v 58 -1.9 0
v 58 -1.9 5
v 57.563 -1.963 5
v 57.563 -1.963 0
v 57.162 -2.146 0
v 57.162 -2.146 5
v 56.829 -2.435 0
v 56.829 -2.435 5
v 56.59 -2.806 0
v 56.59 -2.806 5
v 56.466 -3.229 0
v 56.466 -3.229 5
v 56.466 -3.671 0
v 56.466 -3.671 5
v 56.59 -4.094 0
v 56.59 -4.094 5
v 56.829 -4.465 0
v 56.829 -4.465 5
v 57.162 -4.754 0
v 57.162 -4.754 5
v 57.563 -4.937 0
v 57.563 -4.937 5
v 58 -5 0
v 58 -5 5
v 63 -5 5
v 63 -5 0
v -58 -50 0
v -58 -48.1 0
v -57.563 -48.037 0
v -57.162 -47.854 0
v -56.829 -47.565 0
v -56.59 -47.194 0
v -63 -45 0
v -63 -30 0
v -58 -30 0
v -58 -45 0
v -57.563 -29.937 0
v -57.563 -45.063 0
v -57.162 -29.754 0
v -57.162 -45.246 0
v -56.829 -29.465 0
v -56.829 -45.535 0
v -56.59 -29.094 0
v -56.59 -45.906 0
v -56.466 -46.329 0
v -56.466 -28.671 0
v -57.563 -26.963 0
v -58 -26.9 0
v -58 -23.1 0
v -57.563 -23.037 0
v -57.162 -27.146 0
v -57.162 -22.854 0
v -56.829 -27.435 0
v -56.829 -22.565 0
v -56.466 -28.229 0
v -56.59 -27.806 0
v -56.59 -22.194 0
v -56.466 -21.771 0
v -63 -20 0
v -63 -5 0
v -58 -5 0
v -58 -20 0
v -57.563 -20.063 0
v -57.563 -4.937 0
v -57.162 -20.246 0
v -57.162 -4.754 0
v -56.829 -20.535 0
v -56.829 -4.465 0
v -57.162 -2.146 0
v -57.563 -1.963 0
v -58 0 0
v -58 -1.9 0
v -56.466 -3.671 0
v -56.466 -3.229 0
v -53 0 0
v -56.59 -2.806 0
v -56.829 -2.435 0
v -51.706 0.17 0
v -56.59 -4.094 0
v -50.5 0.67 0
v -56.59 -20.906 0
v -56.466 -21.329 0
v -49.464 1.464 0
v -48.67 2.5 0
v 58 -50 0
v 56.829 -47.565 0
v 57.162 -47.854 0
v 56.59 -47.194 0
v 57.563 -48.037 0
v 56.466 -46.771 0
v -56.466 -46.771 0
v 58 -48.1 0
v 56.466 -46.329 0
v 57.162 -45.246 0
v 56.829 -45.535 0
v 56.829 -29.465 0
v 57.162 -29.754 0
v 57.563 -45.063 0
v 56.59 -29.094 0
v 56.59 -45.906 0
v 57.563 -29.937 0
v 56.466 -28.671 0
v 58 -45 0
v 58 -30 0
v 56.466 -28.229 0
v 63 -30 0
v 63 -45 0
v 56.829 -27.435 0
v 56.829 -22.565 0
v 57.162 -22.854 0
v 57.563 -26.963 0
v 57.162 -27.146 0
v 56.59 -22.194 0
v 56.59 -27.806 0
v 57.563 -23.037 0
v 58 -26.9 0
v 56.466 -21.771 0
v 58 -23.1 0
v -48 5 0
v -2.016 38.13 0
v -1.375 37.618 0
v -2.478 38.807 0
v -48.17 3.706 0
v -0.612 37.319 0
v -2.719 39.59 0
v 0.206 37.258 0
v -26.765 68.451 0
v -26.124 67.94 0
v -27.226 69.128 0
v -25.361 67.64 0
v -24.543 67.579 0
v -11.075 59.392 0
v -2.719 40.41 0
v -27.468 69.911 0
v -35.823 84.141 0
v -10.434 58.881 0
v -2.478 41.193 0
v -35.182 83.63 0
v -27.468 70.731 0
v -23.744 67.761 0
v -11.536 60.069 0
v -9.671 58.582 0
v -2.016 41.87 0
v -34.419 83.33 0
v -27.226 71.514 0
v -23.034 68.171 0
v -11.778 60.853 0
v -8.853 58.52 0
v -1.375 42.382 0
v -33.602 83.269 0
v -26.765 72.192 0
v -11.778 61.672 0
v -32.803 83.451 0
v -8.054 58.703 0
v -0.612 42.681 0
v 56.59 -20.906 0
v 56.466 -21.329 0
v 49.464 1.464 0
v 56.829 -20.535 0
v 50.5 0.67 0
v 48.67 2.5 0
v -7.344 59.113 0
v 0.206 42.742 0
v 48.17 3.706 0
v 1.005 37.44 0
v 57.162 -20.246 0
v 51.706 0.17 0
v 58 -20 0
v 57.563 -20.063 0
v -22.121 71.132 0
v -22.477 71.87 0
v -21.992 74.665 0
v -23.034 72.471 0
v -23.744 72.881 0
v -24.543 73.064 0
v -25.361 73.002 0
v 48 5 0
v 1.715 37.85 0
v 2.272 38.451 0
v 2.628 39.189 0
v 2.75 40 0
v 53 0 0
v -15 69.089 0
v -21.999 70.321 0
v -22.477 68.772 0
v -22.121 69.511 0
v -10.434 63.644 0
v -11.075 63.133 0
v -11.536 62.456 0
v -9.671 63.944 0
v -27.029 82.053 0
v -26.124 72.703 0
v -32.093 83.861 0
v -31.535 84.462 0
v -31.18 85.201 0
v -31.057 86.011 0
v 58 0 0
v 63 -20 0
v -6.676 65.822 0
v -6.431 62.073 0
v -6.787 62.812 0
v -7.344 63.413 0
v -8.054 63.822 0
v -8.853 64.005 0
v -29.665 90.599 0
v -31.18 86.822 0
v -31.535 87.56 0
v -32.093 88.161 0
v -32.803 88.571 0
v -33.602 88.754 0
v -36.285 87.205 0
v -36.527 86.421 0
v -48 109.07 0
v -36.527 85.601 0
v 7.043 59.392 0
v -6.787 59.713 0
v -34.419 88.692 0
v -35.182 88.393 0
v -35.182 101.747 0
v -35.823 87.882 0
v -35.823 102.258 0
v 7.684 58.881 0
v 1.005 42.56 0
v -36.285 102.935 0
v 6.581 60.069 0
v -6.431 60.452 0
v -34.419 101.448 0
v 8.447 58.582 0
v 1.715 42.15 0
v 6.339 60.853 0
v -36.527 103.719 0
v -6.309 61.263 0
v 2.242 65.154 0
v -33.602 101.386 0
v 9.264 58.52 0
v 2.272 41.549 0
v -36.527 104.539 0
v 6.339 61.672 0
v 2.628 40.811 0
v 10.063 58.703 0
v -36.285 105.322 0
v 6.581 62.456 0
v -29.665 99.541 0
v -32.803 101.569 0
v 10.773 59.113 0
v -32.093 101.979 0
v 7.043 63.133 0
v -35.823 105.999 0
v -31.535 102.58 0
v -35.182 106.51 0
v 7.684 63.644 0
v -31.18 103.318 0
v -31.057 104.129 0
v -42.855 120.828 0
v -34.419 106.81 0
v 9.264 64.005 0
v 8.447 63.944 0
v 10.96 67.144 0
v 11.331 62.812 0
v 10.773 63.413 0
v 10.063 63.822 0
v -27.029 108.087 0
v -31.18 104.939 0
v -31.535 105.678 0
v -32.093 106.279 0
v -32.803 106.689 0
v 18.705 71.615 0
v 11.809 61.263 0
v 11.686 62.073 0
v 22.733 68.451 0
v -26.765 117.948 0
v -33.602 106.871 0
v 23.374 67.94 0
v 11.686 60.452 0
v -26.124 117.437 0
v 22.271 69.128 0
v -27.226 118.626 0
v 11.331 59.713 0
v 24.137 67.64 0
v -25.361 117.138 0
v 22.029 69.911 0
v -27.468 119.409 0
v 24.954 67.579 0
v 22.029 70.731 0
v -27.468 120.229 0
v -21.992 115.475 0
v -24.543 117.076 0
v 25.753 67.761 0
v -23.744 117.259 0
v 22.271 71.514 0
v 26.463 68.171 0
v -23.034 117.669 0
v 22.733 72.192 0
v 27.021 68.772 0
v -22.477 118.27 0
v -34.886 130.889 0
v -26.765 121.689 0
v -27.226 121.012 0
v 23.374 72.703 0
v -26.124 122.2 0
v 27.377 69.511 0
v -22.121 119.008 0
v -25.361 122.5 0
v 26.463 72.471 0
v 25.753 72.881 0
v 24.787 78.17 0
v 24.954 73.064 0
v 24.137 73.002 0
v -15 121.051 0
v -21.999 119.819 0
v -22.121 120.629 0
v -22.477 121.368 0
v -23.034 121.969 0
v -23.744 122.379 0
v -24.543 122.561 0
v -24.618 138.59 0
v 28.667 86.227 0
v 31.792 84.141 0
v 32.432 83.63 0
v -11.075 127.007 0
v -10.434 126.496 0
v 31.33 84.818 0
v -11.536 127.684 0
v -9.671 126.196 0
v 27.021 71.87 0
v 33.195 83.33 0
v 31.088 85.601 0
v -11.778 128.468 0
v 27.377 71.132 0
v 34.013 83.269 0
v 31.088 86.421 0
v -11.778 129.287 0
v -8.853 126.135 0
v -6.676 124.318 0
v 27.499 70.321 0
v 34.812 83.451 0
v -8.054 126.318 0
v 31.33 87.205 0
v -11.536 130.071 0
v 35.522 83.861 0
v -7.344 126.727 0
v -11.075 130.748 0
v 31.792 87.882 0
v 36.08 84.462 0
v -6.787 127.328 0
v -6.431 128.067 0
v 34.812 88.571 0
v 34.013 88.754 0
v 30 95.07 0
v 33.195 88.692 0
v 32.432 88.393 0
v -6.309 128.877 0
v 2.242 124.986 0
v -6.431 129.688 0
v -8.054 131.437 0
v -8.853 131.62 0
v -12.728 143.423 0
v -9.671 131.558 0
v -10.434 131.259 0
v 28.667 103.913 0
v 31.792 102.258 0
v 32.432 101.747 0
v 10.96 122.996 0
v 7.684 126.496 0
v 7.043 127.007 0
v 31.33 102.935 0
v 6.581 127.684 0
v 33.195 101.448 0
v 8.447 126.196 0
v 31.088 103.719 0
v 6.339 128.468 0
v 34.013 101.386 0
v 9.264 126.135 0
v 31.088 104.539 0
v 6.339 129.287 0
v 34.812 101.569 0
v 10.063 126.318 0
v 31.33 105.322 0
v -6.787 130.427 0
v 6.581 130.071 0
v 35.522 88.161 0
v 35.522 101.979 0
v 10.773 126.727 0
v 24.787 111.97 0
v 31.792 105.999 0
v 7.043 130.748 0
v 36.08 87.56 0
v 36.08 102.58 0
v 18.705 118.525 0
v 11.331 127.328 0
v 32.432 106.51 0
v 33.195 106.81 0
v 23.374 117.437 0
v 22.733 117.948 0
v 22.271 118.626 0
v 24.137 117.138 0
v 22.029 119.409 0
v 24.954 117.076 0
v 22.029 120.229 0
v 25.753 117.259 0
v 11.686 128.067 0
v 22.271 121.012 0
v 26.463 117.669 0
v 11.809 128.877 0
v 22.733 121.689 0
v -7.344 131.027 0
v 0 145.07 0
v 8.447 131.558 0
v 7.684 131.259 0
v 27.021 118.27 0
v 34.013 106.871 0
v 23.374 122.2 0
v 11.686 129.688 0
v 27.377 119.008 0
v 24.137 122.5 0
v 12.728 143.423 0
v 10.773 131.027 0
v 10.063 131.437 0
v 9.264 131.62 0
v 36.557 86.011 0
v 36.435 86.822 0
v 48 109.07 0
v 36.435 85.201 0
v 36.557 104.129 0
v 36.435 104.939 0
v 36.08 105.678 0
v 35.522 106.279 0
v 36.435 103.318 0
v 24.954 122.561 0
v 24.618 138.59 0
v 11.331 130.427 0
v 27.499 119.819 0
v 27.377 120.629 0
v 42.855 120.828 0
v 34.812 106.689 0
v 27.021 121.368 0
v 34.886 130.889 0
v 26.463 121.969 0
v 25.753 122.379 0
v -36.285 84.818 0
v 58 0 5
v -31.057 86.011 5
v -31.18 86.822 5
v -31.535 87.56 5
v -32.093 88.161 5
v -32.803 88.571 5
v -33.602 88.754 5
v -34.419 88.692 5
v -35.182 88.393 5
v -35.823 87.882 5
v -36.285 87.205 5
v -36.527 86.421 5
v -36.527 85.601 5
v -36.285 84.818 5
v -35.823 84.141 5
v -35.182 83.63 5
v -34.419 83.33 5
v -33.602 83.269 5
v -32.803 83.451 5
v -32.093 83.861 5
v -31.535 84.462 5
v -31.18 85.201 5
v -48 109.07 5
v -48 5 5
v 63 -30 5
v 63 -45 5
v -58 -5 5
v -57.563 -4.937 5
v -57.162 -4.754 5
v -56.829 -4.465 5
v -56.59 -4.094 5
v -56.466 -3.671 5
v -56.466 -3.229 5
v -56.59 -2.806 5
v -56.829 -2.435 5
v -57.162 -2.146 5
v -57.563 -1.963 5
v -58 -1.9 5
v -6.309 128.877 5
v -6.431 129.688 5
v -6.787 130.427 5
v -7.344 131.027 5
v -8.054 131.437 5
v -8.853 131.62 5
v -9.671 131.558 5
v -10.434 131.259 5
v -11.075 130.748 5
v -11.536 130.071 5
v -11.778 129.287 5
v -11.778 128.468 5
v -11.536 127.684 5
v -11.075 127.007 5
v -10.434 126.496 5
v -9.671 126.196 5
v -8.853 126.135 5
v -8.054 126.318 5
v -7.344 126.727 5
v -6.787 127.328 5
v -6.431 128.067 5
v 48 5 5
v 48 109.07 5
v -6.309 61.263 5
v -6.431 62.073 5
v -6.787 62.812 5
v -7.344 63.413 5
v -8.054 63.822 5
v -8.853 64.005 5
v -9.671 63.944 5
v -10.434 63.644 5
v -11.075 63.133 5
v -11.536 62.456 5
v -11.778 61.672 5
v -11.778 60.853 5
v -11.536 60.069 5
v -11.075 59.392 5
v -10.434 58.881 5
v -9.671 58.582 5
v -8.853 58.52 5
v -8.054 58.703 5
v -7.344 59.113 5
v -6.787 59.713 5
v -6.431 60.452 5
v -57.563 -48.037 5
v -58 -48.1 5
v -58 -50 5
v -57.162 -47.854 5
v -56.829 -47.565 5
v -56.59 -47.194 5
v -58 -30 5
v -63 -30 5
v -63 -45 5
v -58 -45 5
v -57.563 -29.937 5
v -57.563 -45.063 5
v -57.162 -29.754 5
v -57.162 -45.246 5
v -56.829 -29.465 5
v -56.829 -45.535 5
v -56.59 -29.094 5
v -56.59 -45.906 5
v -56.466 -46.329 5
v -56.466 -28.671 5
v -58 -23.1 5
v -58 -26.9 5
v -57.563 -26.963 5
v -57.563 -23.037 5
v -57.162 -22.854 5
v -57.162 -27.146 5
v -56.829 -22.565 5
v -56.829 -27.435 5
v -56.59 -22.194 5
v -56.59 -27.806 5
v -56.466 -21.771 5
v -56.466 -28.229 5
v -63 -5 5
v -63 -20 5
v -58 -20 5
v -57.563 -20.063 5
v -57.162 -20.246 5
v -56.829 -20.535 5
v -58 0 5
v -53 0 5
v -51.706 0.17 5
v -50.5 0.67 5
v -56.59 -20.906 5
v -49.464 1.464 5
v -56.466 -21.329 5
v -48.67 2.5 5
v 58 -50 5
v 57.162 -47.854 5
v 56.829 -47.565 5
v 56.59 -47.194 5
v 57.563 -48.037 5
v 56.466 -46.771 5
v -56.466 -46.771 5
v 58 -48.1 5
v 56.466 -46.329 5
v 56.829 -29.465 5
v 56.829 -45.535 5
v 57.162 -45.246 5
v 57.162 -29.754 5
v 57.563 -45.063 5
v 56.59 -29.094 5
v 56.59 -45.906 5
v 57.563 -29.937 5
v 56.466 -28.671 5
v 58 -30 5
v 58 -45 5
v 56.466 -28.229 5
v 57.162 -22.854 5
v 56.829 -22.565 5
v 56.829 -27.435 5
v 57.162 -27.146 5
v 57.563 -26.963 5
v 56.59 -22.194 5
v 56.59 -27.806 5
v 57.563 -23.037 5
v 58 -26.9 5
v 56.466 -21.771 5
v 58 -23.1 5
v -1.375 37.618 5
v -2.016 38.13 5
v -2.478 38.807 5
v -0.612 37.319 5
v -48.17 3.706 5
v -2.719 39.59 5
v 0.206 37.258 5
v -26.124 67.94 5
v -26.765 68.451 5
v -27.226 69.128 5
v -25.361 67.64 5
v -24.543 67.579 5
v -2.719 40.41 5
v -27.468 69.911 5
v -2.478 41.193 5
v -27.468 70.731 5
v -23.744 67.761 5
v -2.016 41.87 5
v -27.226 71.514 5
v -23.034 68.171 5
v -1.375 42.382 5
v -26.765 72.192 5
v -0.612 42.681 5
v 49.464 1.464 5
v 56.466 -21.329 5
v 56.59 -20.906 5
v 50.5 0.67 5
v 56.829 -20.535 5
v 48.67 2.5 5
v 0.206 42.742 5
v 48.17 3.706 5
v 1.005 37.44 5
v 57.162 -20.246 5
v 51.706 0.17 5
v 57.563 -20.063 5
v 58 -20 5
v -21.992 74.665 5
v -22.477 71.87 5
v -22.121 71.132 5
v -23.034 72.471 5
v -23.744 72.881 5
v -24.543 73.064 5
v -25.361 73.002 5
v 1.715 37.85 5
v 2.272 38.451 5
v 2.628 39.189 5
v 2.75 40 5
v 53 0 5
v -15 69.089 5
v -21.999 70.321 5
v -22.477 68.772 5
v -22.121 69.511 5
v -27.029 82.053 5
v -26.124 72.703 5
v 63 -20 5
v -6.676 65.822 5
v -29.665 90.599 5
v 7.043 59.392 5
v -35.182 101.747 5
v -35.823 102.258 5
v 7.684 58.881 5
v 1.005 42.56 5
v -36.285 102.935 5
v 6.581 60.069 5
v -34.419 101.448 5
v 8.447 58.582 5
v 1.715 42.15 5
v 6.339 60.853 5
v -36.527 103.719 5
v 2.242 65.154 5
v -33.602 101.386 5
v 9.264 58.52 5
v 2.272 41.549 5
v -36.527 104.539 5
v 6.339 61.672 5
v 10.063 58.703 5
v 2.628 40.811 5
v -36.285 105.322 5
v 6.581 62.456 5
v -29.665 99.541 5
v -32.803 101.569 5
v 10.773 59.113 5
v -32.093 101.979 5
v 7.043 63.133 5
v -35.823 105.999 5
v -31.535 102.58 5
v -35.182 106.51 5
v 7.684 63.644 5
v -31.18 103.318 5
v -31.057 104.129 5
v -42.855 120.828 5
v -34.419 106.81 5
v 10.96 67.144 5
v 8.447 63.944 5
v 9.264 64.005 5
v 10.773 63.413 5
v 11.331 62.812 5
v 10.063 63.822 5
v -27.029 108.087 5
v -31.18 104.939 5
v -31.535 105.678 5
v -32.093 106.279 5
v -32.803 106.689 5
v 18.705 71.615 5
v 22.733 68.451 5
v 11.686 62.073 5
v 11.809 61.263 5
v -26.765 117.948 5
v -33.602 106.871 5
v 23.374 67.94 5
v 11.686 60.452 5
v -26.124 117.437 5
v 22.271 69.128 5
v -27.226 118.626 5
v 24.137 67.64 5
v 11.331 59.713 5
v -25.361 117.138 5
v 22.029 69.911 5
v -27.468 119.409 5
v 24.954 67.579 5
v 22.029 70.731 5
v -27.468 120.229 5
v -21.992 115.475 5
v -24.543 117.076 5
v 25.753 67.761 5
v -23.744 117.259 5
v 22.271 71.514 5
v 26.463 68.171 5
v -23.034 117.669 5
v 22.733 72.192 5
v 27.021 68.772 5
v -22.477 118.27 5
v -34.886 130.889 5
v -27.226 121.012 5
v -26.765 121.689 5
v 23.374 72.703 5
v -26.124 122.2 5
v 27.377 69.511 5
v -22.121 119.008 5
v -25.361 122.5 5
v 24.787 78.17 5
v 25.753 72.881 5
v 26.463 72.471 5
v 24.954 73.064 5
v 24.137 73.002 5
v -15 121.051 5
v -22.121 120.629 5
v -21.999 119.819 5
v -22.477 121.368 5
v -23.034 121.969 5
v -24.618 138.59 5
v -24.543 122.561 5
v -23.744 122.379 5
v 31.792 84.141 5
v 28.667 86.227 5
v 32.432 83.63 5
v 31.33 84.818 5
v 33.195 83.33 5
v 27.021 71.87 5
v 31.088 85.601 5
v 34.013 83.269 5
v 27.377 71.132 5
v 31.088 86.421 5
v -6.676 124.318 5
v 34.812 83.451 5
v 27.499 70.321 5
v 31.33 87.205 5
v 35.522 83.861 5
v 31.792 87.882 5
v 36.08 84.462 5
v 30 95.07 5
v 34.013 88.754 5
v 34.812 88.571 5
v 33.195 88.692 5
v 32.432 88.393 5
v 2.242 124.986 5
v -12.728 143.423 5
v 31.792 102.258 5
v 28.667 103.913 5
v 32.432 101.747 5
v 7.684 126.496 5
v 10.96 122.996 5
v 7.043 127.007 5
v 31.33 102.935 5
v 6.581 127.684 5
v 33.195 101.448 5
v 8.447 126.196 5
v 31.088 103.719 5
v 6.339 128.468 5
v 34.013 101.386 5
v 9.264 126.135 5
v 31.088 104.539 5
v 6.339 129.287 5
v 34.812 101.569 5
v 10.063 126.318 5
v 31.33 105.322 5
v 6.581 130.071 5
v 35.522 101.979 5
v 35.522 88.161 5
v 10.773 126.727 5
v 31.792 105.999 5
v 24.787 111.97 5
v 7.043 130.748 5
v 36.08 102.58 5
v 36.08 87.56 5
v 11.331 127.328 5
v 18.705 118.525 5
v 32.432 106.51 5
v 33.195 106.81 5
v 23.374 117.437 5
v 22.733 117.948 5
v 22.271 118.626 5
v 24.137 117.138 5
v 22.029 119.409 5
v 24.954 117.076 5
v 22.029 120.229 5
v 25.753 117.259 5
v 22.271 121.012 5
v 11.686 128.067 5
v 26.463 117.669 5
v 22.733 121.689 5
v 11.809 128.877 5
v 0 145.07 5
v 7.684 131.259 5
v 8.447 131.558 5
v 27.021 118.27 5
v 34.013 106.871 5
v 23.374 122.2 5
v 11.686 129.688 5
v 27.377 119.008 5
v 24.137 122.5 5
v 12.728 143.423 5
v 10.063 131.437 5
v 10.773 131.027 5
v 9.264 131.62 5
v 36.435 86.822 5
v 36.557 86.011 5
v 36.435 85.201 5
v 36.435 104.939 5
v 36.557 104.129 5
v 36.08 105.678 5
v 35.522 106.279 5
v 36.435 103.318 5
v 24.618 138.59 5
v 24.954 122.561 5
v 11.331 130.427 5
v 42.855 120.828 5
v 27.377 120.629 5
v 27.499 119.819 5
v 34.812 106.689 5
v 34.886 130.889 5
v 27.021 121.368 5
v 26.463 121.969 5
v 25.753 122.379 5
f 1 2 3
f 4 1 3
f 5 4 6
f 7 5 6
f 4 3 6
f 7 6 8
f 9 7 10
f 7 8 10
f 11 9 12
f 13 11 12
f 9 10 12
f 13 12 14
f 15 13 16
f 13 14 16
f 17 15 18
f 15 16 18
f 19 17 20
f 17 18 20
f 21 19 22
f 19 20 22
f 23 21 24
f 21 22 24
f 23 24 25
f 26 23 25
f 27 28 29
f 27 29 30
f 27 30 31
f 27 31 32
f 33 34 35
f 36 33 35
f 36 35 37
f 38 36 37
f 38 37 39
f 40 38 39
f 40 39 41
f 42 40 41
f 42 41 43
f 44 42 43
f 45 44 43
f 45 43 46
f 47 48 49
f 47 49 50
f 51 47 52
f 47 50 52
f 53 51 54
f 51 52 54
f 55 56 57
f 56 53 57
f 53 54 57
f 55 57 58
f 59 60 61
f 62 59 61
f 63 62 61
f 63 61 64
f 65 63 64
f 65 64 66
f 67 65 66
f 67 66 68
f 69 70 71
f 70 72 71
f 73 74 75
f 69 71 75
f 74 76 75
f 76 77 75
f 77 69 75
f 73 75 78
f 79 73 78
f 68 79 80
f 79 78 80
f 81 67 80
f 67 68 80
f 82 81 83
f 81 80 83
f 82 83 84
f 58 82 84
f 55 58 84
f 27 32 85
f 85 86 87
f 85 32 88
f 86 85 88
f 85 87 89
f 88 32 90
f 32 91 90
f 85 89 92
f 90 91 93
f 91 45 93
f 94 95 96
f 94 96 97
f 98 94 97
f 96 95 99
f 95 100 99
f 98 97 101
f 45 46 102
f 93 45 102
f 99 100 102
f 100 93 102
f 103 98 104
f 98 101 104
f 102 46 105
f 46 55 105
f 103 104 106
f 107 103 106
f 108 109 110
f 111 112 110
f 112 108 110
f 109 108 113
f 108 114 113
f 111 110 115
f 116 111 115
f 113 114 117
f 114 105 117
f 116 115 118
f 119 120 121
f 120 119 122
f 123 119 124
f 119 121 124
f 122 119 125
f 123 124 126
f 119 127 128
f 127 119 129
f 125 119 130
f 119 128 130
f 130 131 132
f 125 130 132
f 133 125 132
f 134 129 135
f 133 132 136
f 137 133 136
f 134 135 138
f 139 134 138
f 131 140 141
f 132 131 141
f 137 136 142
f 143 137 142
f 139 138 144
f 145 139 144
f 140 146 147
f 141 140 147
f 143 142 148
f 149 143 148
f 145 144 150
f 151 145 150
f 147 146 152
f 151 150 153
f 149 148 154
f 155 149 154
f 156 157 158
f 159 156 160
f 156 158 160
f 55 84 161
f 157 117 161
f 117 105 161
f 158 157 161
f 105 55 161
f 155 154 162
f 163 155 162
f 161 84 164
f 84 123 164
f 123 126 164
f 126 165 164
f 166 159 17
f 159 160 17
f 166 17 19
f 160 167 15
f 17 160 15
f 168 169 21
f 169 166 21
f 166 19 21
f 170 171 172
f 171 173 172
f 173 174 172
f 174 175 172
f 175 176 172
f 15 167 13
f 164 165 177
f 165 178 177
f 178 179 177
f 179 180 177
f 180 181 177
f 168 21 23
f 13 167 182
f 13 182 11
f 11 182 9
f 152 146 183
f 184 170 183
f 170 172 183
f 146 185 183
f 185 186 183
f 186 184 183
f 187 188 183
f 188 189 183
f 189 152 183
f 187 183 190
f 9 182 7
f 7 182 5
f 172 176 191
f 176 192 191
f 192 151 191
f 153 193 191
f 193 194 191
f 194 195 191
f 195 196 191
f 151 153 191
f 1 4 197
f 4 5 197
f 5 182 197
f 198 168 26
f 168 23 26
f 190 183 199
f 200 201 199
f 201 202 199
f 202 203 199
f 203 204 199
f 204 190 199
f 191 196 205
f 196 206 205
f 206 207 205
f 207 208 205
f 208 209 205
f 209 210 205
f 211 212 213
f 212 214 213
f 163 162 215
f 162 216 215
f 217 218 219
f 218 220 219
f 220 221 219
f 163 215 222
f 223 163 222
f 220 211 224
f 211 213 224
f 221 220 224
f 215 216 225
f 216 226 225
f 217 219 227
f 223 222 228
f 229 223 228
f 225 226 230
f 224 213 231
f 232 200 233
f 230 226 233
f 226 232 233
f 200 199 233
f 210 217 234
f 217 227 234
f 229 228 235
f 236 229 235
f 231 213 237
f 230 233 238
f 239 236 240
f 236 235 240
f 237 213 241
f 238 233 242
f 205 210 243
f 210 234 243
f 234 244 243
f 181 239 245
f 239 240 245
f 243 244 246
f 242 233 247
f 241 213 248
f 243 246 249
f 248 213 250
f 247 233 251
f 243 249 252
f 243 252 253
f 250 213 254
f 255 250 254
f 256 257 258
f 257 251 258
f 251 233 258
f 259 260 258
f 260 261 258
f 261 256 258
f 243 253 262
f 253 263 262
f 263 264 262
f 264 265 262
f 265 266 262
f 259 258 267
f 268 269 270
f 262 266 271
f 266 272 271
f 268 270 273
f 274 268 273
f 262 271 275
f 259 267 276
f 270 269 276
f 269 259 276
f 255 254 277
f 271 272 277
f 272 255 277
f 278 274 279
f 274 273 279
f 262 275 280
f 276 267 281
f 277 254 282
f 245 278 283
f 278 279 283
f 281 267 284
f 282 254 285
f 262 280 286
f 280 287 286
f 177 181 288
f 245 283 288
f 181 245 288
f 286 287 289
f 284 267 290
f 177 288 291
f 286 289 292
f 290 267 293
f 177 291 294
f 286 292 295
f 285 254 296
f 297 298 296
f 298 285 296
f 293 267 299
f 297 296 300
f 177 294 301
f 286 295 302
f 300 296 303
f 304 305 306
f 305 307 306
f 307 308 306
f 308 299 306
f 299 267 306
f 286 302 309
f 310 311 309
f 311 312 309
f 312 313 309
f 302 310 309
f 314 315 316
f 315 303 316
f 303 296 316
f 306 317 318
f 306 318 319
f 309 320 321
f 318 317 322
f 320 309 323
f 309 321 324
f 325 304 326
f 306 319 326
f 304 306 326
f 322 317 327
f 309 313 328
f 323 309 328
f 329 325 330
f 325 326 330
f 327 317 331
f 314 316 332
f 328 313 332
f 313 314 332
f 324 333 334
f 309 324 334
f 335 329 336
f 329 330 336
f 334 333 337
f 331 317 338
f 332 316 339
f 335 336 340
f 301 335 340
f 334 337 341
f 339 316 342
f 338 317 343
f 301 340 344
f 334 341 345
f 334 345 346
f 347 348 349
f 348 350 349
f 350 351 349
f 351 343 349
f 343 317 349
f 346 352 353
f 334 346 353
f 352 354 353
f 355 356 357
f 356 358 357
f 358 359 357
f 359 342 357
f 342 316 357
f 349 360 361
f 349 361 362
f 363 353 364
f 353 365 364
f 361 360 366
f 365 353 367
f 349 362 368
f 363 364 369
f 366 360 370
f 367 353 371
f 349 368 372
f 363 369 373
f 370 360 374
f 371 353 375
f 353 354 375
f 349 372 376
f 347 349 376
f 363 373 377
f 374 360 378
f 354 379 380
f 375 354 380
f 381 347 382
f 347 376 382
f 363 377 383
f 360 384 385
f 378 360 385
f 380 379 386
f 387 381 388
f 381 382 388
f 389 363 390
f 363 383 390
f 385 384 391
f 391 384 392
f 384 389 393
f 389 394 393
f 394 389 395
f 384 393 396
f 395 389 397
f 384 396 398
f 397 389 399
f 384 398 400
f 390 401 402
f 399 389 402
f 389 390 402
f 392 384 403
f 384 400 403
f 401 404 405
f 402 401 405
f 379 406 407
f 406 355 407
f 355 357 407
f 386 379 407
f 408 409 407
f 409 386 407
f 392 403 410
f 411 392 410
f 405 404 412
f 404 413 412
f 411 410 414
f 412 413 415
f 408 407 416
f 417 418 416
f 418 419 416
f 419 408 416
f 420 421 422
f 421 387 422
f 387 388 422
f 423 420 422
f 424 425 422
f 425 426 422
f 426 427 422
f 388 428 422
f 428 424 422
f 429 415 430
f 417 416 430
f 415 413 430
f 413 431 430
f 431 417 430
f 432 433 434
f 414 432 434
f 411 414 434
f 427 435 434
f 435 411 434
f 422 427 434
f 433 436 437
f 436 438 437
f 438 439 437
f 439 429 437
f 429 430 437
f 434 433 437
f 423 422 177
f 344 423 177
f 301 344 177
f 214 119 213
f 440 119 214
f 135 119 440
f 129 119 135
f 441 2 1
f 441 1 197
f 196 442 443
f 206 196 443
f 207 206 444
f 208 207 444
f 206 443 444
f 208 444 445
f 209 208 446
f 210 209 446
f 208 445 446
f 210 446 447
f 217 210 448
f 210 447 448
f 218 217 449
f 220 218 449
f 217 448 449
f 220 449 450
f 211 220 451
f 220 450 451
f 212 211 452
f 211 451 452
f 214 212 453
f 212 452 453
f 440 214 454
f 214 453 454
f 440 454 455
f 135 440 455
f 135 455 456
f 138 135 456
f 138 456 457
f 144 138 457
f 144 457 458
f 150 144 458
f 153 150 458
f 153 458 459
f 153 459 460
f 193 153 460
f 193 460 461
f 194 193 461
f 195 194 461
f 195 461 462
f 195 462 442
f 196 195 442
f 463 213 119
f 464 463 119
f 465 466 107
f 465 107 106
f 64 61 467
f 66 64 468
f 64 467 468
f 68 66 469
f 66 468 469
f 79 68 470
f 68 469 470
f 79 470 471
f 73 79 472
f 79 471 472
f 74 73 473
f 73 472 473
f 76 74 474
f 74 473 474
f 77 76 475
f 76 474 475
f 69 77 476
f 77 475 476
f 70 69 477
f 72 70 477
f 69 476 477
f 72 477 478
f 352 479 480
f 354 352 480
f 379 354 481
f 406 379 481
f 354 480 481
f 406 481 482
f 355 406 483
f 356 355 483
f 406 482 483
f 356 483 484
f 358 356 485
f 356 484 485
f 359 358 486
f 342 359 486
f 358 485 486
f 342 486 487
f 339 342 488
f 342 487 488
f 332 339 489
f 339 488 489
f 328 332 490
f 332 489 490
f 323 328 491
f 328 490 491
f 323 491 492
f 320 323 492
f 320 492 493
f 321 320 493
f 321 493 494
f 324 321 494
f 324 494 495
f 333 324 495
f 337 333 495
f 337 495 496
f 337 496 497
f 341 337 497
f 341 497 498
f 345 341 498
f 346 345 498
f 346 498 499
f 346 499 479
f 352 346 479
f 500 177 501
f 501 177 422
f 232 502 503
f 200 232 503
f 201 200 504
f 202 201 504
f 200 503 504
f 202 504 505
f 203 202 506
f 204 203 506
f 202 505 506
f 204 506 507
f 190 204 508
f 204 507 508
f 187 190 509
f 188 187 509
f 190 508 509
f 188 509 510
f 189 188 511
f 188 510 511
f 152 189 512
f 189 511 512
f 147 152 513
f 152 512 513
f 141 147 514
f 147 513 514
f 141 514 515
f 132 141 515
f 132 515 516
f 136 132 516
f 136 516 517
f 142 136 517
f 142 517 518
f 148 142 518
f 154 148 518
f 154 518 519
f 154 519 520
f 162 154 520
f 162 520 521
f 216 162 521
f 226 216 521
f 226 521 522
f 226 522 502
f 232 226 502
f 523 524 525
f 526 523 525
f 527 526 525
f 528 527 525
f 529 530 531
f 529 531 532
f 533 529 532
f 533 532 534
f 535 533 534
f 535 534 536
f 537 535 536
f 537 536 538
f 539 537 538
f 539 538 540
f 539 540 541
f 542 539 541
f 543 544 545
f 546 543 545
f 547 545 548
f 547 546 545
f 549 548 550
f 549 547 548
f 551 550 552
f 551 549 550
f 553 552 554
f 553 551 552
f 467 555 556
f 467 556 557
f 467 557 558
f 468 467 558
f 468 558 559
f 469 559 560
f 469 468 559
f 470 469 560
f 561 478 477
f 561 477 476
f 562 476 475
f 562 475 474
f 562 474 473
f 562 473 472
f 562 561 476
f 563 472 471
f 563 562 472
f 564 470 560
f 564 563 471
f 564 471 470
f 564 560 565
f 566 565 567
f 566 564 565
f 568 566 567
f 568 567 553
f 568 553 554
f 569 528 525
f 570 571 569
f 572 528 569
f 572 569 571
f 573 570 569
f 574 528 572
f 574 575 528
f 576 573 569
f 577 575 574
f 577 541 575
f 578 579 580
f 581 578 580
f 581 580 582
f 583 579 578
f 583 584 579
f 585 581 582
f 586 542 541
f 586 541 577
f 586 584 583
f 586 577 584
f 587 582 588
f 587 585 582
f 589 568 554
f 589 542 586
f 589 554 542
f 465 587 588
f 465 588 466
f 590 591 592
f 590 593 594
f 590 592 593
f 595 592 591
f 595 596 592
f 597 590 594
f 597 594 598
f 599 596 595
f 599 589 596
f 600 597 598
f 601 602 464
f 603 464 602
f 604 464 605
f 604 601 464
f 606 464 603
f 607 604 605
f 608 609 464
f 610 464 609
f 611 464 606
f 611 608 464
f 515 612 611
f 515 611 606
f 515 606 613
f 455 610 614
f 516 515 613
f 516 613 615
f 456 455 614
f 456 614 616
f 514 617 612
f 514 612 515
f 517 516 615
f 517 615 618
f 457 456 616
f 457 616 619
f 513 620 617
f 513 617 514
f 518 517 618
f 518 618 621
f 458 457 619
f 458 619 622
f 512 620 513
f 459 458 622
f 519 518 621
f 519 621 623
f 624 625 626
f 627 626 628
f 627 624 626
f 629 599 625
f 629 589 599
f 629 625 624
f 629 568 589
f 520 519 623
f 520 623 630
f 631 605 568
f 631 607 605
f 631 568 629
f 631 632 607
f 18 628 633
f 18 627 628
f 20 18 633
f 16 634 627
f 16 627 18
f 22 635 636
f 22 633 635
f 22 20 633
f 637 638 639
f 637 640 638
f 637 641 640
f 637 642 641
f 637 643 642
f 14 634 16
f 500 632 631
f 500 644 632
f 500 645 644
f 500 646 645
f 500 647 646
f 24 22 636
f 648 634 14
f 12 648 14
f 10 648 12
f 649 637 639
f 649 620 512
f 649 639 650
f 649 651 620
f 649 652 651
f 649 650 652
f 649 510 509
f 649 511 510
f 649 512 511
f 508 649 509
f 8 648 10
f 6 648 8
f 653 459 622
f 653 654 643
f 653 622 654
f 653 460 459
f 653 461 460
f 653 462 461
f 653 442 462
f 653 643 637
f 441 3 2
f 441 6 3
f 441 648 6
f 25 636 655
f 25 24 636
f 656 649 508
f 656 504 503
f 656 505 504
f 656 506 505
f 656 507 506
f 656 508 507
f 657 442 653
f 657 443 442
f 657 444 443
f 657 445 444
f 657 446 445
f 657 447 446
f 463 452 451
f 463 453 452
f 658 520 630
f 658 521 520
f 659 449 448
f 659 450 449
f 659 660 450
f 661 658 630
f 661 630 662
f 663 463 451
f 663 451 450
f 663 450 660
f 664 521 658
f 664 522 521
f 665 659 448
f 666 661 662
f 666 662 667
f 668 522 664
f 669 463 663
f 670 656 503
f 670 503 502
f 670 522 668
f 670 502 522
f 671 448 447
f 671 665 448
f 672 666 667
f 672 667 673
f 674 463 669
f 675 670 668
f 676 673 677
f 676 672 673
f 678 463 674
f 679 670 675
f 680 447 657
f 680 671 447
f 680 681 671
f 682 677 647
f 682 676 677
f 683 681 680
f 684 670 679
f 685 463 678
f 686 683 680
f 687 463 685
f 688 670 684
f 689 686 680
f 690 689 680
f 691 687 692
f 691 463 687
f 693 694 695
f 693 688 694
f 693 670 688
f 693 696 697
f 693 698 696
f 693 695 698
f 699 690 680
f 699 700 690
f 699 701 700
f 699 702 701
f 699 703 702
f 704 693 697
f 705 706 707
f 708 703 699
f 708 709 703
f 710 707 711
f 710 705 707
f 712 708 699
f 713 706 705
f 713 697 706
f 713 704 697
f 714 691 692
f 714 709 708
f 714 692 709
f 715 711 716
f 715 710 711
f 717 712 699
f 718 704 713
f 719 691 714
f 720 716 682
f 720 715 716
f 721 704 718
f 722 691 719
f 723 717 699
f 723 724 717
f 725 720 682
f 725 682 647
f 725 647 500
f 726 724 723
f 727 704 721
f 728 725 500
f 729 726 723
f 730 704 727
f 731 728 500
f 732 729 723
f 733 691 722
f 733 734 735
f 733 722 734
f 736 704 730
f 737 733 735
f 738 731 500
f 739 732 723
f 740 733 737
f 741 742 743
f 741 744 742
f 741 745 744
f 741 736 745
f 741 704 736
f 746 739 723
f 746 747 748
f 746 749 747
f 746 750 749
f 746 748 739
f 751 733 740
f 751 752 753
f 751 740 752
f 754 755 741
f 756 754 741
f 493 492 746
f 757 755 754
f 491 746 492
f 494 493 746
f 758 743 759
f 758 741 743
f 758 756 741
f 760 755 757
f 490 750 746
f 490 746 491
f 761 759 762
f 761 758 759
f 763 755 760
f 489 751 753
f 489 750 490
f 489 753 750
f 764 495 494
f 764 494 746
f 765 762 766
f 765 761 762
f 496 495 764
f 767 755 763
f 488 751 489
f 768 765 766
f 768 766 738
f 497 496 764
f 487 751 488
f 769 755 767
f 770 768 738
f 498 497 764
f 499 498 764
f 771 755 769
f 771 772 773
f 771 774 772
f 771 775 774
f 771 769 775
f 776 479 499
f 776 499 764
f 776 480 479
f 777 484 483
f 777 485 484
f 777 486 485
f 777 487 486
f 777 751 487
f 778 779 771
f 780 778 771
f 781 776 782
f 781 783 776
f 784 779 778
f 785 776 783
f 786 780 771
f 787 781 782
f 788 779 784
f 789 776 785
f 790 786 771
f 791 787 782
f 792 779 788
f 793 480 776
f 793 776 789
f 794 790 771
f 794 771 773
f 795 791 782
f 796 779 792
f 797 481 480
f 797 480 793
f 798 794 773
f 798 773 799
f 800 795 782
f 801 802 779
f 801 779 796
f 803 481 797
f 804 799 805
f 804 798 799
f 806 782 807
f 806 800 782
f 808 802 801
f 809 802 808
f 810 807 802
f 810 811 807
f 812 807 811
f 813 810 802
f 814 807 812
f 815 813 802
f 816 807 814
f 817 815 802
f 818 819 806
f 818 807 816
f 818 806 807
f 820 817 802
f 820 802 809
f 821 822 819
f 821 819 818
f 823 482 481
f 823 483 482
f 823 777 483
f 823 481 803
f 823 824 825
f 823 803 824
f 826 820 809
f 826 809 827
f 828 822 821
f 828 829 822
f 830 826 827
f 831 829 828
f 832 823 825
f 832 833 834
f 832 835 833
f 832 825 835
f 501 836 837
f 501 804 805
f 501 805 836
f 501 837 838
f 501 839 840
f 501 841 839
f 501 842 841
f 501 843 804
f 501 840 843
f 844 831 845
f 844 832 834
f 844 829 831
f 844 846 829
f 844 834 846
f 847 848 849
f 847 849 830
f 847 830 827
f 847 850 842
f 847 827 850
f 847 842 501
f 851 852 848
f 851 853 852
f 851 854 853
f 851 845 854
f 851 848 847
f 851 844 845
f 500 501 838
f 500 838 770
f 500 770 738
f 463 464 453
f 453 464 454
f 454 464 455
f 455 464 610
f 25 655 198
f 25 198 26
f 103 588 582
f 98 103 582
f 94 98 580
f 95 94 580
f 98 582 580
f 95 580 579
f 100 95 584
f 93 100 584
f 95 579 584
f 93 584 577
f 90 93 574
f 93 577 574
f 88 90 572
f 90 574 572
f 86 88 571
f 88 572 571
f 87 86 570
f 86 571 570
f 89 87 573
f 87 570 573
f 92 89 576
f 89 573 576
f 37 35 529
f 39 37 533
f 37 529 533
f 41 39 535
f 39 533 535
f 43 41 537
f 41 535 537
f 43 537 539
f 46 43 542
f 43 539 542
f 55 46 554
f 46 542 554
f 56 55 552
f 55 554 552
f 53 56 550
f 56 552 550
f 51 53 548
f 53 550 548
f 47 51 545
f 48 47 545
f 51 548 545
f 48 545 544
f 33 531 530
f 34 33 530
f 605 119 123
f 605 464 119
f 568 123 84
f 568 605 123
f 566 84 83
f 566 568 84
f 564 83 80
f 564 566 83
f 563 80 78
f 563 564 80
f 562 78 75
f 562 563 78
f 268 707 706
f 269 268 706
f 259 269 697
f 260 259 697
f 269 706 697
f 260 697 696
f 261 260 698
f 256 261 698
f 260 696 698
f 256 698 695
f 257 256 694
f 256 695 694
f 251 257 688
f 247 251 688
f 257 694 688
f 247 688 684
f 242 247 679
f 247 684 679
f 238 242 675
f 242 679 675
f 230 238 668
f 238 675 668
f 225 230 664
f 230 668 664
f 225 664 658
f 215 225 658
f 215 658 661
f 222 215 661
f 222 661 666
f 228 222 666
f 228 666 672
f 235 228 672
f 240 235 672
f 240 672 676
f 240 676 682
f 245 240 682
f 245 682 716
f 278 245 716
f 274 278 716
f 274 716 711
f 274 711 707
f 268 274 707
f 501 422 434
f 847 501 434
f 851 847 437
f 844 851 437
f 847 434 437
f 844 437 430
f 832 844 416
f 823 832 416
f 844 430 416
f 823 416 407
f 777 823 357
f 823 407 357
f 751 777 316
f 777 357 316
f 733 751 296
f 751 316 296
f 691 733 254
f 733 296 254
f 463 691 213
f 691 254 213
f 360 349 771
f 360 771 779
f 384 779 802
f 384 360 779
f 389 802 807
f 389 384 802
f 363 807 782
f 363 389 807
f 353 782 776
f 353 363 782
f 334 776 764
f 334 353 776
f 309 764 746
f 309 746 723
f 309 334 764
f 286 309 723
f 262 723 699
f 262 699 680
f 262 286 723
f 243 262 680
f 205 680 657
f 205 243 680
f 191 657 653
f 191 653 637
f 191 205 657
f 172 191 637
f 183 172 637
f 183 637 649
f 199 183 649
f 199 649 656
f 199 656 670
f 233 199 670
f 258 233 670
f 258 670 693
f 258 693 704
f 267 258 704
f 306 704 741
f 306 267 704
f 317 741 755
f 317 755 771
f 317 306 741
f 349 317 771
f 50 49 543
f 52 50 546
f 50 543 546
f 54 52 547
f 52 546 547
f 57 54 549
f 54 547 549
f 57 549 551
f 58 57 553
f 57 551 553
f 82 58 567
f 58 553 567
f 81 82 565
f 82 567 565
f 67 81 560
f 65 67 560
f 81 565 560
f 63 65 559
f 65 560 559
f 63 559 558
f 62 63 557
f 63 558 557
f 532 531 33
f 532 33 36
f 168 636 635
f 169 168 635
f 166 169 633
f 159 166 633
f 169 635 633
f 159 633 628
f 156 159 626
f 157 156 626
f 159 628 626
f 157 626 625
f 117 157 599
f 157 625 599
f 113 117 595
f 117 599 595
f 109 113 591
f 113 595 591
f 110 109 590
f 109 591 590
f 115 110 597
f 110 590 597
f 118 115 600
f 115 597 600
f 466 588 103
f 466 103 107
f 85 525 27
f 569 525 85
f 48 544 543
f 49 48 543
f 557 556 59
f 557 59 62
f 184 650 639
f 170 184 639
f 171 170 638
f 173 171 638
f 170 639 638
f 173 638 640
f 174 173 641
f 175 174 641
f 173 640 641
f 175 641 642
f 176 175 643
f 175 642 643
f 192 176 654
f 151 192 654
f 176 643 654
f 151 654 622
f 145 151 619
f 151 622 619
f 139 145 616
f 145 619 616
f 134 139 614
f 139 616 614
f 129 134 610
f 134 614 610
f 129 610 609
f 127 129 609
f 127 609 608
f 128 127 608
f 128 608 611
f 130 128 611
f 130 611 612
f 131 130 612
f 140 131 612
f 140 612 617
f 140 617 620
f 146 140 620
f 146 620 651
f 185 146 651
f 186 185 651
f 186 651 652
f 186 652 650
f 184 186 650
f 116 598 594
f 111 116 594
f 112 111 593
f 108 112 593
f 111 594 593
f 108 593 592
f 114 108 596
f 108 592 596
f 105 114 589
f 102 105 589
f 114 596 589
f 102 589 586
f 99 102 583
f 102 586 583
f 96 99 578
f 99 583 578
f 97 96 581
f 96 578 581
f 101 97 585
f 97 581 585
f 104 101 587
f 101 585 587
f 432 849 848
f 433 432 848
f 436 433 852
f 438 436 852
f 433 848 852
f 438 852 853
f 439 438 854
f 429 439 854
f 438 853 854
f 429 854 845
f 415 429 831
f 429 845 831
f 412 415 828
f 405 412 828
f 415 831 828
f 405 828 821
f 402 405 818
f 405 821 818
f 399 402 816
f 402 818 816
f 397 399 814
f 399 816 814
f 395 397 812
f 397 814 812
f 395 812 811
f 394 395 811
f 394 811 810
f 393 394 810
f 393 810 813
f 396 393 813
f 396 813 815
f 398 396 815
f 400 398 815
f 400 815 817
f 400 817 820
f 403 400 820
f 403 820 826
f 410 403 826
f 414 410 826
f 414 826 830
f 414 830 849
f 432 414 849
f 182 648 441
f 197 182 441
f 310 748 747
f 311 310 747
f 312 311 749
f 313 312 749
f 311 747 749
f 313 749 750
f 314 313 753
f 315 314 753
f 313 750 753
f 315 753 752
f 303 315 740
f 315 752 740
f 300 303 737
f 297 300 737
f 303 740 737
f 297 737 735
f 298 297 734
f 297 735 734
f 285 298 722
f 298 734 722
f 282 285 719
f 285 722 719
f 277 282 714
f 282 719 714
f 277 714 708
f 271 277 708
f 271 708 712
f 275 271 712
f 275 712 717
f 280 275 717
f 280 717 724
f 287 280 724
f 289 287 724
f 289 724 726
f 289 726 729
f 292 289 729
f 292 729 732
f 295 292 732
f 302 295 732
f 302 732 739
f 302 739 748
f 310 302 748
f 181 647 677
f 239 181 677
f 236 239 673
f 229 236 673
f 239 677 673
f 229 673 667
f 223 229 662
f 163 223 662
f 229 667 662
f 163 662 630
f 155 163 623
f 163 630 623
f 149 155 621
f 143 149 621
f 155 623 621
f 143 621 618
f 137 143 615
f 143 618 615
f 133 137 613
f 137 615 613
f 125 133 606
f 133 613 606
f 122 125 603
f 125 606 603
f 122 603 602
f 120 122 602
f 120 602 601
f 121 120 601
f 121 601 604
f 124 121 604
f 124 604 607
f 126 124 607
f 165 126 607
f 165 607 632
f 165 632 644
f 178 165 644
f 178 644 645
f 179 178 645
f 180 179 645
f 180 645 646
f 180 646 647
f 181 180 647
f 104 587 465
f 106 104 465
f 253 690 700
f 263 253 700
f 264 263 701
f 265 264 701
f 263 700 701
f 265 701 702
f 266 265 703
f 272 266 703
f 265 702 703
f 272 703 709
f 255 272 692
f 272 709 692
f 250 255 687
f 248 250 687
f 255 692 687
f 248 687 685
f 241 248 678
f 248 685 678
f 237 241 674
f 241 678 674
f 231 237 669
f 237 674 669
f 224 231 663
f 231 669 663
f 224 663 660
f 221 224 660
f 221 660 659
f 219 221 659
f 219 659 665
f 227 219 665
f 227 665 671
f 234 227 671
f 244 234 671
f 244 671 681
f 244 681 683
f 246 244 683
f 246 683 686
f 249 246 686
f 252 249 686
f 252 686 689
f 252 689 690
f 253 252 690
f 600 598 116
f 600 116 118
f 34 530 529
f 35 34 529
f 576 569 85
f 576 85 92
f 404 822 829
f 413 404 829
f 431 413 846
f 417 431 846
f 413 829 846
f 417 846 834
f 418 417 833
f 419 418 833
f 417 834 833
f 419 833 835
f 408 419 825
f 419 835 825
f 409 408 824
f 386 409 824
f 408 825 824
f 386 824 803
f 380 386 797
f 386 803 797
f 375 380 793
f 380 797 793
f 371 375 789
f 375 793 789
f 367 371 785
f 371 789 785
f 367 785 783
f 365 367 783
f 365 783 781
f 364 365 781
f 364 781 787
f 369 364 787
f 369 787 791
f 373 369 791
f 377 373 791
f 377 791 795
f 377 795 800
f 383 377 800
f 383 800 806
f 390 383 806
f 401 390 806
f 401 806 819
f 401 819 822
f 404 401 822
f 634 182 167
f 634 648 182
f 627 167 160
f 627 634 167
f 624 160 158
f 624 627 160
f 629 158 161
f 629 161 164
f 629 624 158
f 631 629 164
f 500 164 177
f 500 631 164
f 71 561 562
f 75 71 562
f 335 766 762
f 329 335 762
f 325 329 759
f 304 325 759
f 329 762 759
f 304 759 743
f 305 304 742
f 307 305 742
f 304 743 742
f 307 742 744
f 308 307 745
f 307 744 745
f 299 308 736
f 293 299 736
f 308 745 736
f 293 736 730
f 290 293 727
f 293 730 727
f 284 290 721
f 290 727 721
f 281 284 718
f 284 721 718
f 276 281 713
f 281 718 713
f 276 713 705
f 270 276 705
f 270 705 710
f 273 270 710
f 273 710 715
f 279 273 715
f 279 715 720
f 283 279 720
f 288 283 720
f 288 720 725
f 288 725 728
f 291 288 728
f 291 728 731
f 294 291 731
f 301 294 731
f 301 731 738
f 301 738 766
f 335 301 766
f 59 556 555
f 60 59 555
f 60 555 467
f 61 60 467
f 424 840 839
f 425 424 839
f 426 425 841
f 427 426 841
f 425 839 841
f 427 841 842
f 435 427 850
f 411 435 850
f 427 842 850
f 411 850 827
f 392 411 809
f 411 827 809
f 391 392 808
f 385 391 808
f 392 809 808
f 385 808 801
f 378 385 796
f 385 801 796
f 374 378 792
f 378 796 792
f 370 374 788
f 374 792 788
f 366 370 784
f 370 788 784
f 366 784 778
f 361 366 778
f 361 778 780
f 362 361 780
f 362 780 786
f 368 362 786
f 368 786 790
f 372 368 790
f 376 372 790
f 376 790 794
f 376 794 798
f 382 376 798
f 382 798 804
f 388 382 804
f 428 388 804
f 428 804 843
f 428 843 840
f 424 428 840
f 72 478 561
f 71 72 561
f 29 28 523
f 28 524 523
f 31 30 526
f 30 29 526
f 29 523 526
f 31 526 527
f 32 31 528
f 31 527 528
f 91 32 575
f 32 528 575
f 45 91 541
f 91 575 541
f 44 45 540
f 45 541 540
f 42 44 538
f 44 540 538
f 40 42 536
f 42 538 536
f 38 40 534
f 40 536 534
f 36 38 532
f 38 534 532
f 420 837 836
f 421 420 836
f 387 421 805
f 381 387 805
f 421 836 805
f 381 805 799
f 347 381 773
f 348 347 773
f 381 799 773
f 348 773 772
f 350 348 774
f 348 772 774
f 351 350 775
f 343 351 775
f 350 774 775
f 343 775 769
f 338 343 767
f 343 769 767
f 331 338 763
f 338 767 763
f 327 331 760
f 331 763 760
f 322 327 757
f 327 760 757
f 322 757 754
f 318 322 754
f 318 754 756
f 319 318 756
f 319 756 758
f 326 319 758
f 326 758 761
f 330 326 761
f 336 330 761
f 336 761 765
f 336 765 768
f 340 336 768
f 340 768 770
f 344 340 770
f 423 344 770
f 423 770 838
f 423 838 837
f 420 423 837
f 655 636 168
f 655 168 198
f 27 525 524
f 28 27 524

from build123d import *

# Parameters (mm, degrees)
SKETCH_1_R          = 30
EXTRUDE_1_DEPTH     = 5
SKETCH_3_R          = 2.75
CUT_EXTRUDE_2_DEPTH = 20
SKETCH_4_R          = 2.75
CUT_EXTRUDE_3_DEPTH = 10
SKETCH_5_W          = 116
SKETCH_5_H          = 50
EXTRUDE_2_DEPTH     = 5
SKETCH_8_W          = 5
SKETCH_8_H          = 15
EXTRUDE_3_DEPTH     = 5
SKETCH_9_R          = 1.55
CUT_EXTRUDE_6_DEPTH = 5
FILLET_1_R          = 5


with BuildPart() as part:
    # 草图1 → 凸台-拉伸1 (new body)
    with BuildSketch(Plane.XY):
        with BuildLine():
            Line((-48, 109.07), (-48, 0))
            Line((-48, 0), (48, 0))
            Line((48, 0), (48, 109.07))
            ThreePointArc((48, 109.07), (0, 145.07), (-48, 109.07))
        make_face()
        with Locations((0, 95.07)):
            Circle(SKETCH_1_R, mode=Mode.SUBTRACT)
    extrude(amount=EXTRUDE_1_DEPTH)

    # 草图3 → 切除-拉伸2 (cut)
    with BuildSketch(Plane.XY.offset(5)):
        with Locations((0, 40)):
            Circle(SKETCH_3_R)
    extrude(amount=-CUT_EXTRUDE_2_DEPTH, mode=Mode.SUBTRACT)

    # 草图4 → 切除-拉伸3 (cut)
    with BuildSketch(Plane.XY.offset(5)):
        with Locations((9.058666579, 128.87740392)):
            Circle(SKETCH_4_R)
        with Locations((24.748737342, 119.818737342)):
            Circle(SKETCH_4_R)
        with Locations((33.80740392, 104.128666579)):
            Circle(SKETCH_4_R)
        with Locations((33.80740392, 86.011333421)):
            Circle(SKETCH_4_R)
        with Locations((24.748737342, 70.321262658)):
            Circle(SKETCH_4_R)
        with Locations((9.058666579, 61.26259608)):
            Circle(SKETCH_4_R)
        with Locations((-9.058666579, 61.26259608)):
            Circle(SKETCH_4_R)
        with Locations((-24.748737342, 70.321262658)):
            Circle(SKETCH_4_R)
        with Locations((-33.80740392, 86.011333421)):
            Circle(SKETCH_4_R)
        with Locations((-33.80740392, 104.128666579)):
            Circle(SKETCH_4_R)
        with Locations((-24.748737342, 119.818737342)):
            Circle(SKETCH_4_R)
        with Locations((-9.058666579, 128.87740392)):
            Circle(SKETCH_4_R)
    extrude(amount=-CUT_EXTRUDE_3_DEPTH, mode=Mode.SUBTRACT)

    # 草图5 → 凸台-拉伸2 (add)
    with BuildSketch(Plane.XY.offset(5)):
        with Locations((0, -25)):
            Rectangle(SKETCH_5_W, SKETCH_5_H)
    extrude(amount=-EXTRUDE_2_DEPTH)

    # 草图8 → 凸台-拉伸3 (add)
    with BuildSketch(Plane.XY.offset(5)):
        with Locations((60.5, -12.5)):
            Rectangle(SKETCH_8_W, SKETCH_8_H)
        with Locations((60.5, -37.5)):
            Rectangle(SKETCH_8_W, SKETCH_8_H)
        with Locations((-60.5, -37.5)):
            Rectangle(SKETCH_8_W, SKETCH_8_H)
        with Locations((-60.5, -12.5)):
            Rectangle(SKETCH_8_W, SKETCH_8_H)
    extrude(amount=-EXTRUDE_3_DEPTH)

    # 草图9 → 切除-拉伸6 (cut)
    with BuildSketch(Plane.XY.offset(5)):
        with Locations((58, -3.45)):
            Circle(SKETCH_9_R)
        with Locations((58, -21.55)):
            Circle(SKETCH_9_R)
        with Locations((58, -28.45)):
            Circle(SKETCH_9_R)
        with Locations((58, -46.55)):
            Circle(SKETCH_9_R)
        with Locations((-58, -46.55)):
            Circle(SKETCH_9_R)
        with Locations((-58, -28.45)):
            Circle(SKETCH_9_R)
        with Locations((-58, -21.55)):
            Circle(SKETCH_9_R)
        with Locations((-58, -3.45)):
            Circle(SKETCH_9_R)
    extrude(amount=-CUT_EXTRUDE_6_DEPTH, mode=Mode.SUBTRACT)

    # 圆角1
    fillet_1_edges = [part.edges().sort_by_distance(p)[0] for p in [
        (48, 0, 2.5),
        (-48, 0, 2.5),
    ]]
    fillet(fillet_1_edges, radius=FILLET_1_R)


solid = part.part
